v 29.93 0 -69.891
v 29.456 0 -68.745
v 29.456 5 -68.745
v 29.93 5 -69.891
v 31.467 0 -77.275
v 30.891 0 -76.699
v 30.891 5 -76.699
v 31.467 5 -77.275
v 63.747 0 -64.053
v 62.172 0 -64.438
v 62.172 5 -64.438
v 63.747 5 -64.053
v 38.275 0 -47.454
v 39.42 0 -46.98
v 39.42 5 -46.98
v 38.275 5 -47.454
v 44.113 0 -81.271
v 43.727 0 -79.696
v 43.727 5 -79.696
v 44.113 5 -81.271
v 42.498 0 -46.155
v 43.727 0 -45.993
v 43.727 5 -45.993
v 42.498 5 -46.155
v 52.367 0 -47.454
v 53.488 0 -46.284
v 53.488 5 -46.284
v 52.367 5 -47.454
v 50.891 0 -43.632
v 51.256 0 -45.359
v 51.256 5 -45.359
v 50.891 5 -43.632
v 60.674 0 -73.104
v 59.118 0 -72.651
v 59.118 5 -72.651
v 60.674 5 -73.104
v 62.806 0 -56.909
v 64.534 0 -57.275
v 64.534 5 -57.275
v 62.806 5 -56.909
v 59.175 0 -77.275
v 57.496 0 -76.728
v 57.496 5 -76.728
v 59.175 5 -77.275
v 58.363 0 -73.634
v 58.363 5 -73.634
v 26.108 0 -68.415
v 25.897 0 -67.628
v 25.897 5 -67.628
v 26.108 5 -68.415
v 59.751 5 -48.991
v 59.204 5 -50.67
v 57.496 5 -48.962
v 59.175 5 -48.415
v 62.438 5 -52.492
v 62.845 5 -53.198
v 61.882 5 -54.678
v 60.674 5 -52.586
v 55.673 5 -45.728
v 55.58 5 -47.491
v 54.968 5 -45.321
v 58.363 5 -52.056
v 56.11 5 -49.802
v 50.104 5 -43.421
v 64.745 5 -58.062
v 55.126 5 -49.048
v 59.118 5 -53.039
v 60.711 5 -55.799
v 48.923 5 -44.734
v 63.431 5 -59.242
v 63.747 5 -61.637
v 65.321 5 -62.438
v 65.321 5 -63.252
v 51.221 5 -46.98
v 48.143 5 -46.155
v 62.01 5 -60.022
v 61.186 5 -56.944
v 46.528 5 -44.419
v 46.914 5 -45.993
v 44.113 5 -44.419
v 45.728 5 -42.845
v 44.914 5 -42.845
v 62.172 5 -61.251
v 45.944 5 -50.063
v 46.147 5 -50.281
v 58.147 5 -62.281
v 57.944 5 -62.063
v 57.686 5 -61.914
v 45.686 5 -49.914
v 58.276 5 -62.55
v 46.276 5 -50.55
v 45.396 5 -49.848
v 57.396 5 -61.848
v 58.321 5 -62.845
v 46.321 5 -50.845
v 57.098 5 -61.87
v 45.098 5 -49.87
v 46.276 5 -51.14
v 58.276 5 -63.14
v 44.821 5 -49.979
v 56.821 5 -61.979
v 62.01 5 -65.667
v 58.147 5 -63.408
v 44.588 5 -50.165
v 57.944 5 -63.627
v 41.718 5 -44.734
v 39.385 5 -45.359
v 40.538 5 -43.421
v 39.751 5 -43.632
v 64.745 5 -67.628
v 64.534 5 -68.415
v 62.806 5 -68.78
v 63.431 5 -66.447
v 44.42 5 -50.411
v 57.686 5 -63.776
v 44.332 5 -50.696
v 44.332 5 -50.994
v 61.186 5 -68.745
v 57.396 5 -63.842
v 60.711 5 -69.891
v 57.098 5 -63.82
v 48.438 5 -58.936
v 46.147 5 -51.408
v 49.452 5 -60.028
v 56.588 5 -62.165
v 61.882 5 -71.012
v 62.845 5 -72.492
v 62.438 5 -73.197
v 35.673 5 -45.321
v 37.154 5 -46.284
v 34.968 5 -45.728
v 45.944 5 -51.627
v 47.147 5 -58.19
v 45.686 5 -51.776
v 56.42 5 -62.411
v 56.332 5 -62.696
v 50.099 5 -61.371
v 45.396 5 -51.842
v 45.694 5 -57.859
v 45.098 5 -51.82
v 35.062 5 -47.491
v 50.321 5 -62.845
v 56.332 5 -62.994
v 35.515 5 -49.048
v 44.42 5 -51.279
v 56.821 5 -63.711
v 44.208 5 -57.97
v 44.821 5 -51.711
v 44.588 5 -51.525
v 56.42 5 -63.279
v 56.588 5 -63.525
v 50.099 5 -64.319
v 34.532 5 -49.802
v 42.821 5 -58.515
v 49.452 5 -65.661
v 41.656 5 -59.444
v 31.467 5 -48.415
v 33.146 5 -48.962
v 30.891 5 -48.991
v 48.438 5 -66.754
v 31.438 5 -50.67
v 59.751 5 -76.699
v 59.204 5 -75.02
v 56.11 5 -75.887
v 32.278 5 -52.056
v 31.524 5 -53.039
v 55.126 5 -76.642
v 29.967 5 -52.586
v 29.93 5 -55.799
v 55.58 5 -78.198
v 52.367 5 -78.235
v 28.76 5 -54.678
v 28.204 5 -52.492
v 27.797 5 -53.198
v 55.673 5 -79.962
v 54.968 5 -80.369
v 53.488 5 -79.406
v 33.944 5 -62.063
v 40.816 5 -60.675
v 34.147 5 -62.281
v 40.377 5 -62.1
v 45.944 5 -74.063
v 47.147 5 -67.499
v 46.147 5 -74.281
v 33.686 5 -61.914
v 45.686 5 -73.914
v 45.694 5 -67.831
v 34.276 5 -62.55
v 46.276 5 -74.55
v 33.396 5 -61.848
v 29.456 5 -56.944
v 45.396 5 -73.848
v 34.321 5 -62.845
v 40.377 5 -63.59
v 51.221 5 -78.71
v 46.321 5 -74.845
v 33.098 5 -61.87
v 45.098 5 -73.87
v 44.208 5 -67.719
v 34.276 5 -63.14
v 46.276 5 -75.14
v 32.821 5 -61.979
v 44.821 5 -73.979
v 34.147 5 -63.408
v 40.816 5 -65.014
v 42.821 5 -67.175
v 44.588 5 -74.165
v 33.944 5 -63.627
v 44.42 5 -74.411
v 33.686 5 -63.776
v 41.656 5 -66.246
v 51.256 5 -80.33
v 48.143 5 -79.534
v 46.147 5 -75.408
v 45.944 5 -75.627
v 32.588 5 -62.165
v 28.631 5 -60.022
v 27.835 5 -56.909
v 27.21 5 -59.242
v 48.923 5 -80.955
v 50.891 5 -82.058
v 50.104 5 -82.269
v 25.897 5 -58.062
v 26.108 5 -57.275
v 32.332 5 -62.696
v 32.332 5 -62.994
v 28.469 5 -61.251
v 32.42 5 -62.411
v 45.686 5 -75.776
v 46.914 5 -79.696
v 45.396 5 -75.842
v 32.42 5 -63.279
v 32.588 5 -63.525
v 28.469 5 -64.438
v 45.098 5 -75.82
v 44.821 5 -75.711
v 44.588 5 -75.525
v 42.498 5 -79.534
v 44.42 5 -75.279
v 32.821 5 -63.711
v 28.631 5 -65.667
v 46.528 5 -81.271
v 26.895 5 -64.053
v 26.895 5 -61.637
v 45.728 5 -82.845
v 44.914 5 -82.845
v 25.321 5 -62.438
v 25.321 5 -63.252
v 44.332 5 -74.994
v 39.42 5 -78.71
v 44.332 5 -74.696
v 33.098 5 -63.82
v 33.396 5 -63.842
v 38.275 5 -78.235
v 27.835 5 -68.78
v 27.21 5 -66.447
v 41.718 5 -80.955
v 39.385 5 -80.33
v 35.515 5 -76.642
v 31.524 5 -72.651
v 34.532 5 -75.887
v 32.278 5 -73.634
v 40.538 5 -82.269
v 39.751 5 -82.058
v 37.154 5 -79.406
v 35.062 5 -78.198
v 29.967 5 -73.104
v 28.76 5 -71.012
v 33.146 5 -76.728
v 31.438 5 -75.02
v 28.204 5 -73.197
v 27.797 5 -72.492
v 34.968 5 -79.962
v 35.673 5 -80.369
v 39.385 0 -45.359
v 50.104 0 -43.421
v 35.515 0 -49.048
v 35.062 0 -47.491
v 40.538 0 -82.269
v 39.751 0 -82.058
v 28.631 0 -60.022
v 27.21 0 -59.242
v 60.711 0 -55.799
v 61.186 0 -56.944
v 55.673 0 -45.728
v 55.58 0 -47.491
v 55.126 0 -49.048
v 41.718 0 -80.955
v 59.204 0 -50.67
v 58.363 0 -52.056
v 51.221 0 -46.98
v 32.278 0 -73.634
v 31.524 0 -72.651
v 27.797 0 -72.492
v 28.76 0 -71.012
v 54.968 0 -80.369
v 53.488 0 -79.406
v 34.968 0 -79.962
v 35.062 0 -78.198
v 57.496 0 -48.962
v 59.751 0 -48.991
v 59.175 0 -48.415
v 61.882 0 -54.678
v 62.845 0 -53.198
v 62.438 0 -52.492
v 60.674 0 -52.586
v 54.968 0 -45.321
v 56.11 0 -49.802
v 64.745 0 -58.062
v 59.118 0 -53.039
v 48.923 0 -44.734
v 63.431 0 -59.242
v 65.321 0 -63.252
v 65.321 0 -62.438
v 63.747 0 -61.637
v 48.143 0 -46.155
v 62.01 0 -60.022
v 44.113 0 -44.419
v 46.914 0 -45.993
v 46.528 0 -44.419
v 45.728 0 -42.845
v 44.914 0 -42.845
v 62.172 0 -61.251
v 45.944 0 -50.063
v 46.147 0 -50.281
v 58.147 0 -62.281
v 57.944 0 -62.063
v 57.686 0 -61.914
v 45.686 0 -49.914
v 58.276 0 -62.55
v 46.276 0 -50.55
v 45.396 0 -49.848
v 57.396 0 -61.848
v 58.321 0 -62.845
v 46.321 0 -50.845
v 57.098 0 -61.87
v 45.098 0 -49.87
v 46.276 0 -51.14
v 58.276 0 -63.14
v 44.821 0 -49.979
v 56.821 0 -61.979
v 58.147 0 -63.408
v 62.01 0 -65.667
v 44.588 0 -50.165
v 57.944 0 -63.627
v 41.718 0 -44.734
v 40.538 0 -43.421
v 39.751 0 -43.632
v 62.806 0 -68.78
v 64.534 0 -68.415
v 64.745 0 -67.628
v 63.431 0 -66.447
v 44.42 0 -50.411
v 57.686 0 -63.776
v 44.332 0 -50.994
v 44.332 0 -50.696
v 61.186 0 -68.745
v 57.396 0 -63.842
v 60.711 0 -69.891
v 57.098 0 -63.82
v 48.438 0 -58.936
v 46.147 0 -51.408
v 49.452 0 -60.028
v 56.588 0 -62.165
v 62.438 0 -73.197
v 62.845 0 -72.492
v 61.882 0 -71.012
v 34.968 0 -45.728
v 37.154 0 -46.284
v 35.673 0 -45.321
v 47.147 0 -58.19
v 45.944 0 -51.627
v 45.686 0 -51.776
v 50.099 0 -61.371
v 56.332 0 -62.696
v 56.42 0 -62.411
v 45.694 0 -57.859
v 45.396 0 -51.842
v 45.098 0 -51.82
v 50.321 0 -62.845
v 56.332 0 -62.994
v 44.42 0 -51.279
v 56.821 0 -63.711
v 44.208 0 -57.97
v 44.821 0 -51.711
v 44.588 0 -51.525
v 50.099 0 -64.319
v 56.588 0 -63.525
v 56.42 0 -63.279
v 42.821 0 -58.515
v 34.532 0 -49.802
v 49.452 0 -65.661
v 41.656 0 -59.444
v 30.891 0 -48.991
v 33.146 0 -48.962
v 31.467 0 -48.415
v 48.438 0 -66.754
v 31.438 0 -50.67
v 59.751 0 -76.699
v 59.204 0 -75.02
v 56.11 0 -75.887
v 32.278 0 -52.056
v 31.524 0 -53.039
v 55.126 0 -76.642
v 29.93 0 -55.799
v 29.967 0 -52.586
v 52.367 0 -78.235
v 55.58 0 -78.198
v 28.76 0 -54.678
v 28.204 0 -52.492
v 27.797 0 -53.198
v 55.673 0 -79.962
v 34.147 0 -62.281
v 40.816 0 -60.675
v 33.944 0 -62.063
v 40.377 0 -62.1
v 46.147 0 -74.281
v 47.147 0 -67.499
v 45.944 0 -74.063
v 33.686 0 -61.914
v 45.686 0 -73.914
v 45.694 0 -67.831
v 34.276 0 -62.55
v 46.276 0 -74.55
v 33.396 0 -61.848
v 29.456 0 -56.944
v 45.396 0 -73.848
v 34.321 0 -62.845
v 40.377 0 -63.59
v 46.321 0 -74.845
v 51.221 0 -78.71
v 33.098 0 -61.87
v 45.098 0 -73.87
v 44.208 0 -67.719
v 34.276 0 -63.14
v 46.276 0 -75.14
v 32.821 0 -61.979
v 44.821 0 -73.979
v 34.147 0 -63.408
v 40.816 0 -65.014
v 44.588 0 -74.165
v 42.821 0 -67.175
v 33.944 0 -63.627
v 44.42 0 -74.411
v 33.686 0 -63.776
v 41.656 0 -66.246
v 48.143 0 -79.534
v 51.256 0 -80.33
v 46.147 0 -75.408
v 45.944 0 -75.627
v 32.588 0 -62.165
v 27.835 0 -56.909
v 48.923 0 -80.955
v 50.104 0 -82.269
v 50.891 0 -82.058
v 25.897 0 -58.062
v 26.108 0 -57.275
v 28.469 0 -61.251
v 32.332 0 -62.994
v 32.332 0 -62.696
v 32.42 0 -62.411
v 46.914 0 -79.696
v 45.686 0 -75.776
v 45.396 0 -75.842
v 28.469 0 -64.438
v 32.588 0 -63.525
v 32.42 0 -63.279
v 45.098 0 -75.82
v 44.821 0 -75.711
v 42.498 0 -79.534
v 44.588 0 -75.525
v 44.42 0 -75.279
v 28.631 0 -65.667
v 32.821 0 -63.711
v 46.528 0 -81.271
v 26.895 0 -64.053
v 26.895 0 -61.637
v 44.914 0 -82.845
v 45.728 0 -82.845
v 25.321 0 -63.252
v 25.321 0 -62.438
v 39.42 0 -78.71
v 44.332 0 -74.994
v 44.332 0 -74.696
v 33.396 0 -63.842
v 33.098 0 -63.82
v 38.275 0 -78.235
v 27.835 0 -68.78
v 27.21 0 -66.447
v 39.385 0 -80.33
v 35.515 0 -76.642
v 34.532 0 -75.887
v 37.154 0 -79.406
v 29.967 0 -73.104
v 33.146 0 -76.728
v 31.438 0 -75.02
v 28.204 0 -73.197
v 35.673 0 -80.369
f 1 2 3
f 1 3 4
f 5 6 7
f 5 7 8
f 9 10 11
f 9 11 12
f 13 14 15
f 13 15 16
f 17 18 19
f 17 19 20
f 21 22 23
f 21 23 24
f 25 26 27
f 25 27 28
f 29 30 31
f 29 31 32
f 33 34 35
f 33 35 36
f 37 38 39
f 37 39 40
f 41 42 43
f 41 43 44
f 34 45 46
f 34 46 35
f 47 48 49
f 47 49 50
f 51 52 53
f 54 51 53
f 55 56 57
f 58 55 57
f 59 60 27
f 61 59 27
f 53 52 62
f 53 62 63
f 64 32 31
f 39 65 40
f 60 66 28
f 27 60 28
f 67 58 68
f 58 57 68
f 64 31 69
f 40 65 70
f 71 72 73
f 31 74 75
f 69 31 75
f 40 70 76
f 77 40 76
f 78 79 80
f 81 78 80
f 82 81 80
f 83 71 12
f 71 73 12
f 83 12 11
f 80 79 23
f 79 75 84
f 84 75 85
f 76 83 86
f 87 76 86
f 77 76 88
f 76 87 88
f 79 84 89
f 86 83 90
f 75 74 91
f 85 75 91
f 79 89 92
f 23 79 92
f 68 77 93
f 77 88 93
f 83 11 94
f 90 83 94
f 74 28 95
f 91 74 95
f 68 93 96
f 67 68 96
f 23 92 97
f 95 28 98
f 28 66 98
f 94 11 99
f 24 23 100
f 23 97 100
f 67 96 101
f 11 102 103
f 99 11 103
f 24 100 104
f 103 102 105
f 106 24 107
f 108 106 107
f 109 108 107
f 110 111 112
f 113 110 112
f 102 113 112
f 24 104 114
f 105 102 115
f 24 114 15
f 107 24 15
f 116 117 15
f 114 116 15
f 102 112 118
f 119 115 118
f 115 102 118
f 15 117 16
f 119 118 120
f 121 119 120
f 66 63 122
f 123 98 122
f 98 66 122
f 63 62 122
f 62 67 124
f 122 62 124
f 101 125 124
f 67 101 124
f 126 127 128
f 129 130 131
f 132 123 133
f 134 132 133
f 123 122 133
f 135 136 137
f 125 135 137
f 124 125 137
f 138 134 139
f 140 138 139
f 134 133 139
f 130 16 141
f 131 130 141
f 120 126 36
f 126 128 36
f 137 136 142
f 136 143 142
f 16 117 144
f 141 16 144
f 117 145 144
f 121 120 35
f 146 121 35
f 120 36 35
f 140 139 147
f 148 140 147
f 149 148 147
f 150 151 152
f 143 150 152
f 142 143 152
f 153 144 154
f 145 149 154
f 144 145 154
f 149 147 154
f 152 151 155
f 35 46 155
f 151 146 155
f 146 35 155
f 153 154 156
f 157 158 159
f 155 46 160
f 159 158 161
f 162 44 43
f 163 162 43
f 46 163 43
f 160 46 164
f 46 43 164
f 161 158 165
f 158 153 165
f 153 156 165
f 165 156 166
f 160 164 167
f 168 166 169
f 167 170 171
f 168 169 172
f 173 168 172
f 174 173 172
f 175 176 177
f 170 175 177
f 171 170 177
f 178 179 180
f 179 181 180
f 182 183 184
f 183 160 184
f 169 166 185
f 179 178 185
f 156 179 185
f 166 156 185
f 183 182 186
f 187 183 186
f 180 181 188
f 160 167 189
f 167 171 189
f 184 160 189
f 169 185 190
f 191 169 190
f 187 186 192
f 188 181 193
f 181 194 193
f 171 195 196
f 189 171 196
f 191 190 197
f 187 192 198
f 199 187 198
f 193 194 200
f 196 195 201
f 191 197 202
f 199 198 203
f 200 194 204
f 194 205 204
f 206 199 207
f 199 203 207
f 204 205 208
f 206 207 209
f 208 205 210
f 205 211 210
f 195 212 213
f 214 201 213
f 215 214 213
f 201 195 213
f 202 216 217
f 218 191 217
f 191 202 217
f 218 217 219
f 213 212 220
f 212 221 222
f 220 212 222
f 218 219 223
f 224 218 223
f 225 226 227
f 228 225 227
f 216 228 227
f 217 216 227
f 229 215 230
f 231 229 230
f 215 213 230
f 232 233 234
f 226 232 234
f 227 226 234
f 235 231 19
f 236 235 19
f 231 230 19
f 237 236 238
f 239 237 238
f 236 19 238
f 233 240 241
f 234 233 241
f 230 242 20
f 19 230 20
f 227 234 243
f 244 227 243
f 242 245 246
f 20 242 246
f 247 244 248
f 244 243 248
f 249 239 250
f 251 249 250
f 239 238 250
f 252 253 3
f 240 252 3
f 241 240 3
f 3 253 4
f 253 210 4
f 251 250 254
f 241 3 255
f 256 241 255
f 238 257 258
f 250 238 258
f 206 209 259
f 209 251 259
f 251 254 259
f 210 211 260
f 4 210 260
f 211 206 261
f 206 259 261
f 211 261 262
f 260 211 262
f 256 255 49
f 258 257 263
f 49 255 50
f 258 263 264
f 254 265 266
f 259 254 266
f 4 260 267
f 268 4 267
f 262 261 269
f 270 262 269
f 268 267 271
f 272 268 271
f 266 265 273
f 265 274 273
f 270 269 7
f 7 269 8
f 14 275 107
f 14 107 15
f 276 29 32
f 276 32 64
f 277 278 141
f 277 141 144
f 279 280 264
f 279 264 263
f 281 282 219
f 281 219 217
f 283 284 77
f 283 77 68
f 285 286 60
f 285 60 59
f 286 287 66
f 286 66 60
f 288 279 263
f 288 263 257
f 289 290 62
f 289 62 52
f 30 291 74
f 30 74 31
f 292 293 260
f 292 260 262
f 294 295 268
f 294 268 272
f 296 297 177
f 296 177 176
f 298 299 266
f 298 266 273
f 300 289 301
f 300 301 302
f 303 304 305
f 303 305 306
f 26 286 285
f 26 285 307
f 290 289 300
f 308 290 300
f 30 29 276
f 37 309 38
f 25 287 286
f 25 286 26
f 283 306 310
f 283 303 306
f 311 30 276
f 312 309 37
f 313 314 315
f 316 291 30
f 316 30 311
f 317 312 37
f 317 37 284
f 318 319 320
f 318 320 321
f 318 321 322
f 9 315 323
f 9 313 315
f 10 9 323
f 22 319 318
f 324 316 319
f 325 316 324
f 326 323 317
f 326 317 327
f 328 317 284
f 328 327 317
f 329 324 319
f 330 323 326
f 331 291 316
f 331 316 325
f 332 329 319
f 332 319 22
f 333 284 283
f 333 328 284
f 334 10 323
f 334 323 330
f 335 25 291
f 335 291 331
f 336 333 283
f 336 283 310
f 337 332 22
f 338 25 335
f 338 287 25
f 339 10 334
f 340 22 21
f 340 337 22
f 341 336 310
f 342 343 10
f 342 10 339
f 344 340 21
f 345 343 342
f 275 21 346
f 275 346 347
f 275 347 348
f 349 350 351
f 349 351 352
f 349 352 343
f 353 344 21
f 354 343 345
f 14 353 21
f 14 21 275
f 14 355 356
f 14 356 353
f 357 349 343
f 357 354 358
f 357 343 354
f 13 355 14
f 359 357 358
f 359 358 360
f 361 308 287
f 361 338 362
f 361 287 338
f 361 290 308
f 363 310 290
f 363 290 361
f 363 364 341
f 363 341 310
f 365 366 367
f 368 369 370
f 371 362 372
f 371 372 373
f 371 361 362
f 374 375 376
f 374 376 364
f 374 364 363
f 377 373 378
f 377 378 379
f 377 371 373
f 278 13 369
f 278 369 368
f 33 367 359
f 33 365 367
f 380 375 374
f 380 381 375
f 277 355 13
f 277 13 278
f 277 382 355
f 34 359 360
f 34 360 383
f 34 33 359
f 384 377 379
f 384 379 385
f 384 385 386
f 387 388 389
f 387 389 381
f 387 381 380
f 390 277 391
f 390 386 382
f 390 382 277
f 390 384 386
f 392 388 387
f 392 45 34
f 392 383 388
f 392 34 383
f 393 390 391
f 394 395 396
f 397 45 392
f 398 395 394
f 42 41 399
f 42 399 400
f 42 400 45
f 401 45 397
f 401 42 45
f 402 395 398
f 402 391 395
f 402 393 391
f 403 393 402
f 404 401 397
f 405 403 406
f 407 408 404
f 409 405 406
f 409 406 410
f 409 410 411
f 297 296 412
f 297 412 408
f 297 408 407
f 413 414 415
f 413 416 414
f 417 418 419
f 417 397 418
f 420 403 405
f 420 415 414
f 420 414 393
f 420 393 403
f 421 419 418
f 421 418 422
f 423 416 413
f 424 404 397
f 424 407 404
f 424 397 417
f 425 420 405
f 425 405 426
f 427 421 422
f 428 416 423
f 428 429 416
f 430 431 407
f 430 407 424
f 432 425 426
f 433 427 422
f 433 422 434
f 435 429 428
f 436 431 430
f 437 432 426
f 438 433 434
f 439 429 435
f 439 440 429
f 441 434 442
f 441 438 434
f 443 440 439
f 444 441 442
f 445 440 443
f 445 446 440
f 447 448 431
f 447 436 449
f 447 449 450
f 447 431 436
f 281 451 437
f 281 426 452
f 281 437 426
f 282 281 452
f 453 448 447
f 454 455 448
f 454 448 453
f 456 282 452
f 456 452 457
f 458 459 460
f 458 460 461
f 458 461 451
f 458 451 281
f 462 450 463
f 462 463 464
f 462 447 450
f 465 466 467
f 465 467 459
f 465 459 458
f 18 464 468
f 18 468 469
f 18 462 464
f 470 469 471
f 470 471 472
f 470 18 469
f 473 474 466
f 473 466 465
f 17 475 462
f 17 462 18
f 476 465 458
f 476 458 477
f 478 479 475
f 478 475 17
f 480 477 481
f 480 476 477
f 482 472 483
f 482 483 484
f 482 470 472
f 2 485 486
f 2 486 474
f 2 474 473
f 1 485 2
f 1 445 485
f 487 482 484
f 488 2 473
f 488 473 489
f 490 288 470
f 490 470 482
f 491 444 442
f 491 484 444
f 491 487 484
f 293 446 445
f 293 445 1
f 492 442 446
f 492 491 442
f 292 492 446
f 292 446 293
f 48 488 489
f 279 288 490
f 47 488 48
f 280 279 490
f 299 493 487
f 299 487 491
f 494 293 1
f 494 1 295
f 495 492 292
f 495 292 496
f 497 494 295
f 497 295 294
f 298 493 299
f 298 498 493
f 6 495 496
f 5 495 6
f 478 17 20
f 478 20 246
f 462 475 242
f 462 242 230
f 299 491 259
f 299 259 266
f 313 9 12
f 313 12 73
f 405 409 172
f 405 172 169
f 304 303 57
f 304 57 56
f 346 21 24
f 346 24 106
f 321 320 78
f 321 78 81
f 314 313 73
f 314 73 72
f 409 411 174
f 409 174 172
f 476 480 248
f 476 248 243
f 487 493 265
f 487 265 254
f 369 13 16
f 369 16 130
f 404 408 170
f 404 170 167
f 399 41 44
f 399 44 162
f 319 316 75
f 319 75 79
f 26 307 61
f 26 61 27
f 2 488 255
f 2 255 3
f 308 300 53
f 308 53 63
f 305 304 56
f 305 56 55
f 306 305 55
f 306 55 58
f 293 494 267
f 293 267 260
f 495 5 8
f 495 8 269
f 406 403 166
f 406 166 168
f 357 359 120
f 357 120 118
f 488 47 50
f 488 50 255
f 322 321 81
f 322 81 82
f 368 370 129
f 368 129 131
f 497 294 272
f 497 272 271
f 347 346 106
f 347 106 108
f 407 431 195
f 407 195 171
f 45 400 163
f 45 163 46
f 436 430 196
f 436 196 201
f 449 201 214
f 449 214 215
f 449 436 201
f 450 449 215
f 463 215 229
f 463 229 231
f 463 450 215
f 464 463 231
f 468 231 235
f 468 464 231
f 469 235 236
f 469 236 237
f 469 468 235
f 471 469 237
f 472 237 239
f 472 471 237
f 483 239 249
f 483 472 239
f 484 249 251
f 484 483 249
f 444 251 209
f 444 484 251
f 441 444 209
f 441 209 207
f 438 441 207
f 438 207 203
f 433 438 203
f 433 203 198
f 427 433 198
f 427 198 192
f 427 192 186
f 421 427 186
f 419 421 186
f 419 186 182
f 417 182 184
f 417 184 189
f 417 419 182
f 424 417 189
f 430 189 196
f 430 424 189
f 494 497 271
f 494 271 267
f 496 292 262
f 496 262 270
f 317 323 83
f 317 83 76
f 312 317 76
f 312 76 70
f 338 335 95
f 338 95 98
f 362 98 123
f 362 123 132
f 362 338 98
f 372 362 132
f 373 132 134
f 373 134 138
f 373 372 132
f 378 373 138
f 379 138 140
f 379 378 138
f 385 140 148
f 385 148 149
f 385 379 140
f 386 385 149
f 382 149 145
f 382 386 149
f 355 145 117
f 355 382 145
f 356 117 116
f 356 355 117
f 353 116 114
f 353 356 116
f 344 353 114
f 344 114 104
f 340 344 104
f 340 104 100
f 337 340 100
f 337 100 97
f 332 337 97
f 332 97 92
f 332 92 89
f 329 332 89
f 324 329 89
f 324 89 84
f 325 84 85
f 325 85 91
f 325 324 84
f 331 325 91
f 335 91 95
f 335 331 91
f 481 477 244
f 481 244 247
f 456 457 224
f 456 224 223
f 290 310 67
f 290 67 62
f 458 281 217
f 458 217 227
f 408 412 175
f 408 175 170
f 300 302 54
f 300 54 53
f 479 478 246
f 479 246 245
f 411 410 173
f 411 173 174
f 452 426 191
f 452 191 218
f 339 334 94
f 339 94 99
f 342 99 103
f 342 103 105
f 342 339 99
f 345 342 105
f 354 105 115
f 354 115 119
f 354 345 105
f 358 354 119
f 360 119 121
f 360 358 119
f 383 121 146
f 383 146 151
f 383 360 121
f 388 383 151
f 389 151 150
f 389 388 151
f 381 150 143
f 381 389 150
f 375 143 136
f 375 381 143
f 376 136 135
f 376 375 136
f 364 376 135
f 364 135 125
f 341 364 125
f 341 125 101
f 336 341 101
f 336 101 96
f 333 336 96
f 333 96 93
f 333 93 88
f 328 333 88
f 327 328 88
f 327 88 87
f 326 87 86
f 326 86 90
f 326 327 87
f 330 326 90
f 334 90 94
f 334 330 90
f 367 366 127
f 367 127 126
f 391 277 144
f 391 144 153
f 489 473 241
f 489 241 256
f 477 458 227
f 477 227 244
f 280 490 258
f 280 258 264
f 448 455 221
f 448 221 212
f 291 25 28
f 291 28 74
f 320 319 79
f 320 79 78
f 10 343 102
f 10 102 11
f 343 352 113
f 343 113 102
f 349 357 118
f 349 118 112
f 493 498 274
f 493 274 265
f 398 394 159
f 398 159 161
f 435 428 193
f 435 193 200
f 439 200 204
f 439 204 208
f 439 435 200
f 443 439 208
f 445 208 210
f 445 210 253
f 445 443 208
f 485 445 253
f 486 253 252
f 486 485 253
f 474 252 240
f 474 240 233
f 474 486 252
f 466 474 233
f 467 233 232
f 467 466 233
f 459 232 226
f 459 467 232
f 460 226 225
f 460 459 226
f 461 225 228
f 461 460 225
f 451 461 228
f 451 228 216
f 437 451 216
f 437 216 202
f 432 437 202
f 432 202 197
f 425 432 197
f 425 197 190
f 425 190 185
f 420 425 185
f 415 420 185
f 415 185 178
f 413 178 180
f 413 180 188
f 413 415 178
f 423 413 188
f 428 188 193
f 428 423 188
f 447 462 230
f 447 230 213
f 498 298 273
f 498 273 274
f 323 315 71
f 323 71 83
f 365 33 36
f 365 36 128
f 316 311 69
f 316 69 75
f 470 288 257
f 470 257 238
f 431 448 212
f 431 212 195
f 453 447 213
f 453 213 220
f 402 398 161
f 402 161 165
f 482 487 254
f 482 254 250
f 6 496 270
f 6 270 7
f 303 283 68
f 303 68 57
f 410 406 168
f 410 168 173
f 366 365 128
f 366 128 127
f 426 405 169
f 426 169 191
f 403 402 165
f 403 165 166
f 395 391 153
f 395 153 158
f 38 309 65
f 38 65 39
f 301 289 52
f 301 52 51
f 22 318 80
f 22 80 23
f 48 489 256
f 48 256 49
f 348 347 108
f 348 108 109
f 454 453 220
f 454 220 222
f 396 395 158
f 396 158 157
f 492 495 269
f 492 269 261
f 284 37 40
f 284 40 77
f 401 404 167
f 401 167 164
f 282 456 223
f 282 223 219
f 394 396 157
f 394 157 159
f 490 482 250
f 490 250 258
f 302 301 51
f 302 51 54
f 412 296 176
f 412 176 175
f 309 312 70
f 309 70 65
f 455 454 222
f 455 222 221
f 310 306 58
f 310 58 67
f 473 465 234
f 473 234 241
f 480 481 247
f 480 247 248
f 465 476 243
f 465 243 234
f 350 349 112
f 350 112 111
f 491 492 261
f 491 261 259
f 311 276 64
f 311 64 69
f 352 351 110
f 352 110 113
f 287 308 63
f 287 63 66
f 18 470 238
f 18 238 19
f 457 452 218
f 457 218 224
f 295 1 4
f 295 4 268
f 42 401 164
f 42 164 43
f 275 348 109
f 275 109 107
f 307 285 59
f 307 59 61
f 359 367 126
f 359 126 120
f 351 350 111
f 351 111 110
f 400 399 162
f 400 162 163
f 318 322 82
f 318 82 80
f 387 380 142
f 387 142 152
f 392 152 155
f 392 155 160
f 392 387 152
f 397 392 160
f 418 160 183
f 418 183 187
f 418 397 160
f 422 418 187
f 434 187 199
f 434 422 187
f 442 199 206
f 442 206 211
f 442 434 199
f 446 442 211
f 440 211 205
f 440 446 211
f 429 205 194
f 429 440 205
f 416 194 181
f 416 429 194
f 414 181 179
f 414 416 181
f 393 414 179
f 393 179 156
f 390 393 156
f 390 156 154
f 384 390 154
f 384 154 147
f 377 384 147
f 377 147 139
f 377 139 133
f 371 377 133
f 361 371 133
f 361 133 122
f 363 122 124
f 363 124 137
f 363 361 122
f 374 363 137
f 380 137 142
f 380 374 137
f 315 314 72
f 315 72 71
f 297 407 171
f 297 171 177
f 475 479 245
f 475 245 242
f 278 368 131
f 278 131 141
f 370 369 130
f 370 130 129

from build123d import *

# Parameters (mm, degrees)
BOSS_EXTRUDE1_DEPTH = 5
SKETCH4_R           = 5
CUT_EXTRUDE1_DEPTH  = 5
SKETCH5_R           = 1
CUT_EXTRUDE2_DEPTH  = 5


with BuildPart() as part:
    # Sketch2 → Boss-Extrude1 (new body)
    with BuildSketch(Plane(origin=(0, 0, 0), x_dir=(1, 0, 0), z_dir=(0, 1, 0))):
        Polygon((62.172127475, 64.438287146), (63.746631591, 64.052516421), (65.320772998, 63.251970245), (65.320772998, 62.437646696), (63.746631591, 61.63710052), (62.172127475, 61.251330223), (62.010422663, 60.022472316), (63.431319755, 59.242350893), (64.744655445, 58.061714434), (64.533883435, 57.275066391), (62.806134576, 56.909358138), (61.185584837, 56.944164493), (60.711227056, 55.799059379), (61.881832707, 54.677762874), (62.844929445, 53.197526256), (62.437646696, 52.492214089), (60.674124543, 52.585997689), (59.117748594, 53.03908454), (58.363248469, 52.055804998), (59.203797973, 50.66971469), (59.750789184, 48.990670319), (59.174913579, 48.414794286), (57.495869208, 48.961785926), (56.1097789, 49.80233543), (55.126499358, 49.047834876), (55.579586209, 47.491459356), (55.67336981, 45.727937202), (54.968057642, 45.320654453), (53.487820596, 46.283751191), (52.366524519, 47.454356415), (51.221419405, 46.979999061), (51.25622576, 45.359448894), (50.890517507, 43.631700463), (50.103869465, 43.420928454), (48.923233005, 44.734264143), (48.143111582, 46.155161235), (46.914253675, 45.993456423), (46.528483378, 44.418952307), (45.727937202, 42.8448109), (44.913613653, 42.8448109), (44.113067477, 44.418952307), (43.727296752, 45.993456423), (42.498439273, 46.155161235), (41.718317422, 44.734264143), (40.537680963, 43.420928454), (39.751033348, 43.631700463), (39.385325095, 45.359448894), (39.420131451, 46.979999061), (38.275026336, 47.454356415), (37.153729831, 46.283751191), (35.673492785, 45.320654453), (34.968181046, 45.727937202), (35.061964647, 47.491459356), (35.515051497, 49.047834876), (34.531771955, 49.80233543), (33.145681219, 48.961785926), (31.466637276, 48.414794286), (30.890761243, 48.990670319), (31.437752883, 50.66971469), (32.278302387, 52.055804998), (31.523801833, 53.03908454), (29.967425885, 52.585997689), (28.20390416, 52.492214089), (27.796621411, 53.197526256), (28.759718149, 54.677762874), (29.930323372, 55.799059379), (29.455966018, 56.944164493), (27.835415852, 56.909358138), (26.107666992, 57.275066391), (25.896895411, 58.061714434), (27.210231101, 59.242350893), (28.631127764, 60.022472316), (28.46942338, 61.251330223), (26.894919264, 61.63710052), (25.320777429, 62.437646696), (25.320777429, 63.251970245), (26.894919264, 64.052516421), (28.46942338, 64.438287146), (28.631127764, 65.667144625), (27.210231101, 66.447266476), (25.896895411, 67.627902507), (26.107666992, 68.41455055), (27.835415852, 68.780258803), (29.455966018, 68.745452448), (29.930323372, 69.890557562), (28.759718149, 71.011854067), (27.796621411, 72.492090685), (28.20390416, 73.197402852), (29.967425885, 73.103619252), (31.523801833, 72.650532401), (32.278302387, 73.633811943), (31.437752883, 75.019902251), (30.890761243, 76.698946622), (31.466637276, 77.274822655), (33.145681219, 76.727831015), (34.531771955, 75.887281511), (35.515051497, 76.641782065), (35.061964647, 78.198157585), (34.968181046, 79.961679739), (35.673492785, 80.368962487), (37.153729831, 79.40586575), (38.275026336, 78.235260526), (39.420131451, 78.70961788), (39.385325095, 80.330168047), (39.751033348, 82.057916906), (40.537680963, 82.268688487), (41.718317422, 80.955352798), (42.498439273, 79.534456134), (43.727296752, 79.696160518), (44.113067477, 81.270664634), (44.913613653, 82.844806041), (45.727937202, 82.844806041), (46.528483378, 81.270664634), (46.914253675, 79.696160518), (48.143111582, 79.534456134), (48.923233005, 80.955352798), (50.103869465, 82.268688487), (50.890517507, 82.057916906), (51.25622576, 80.330168047), (51.221419405, 78.70961788), (52.366524519, 78.235260526), (53.487820596, 79.40586575), (54.968057642, 80.368962487), (55.67336981, 79.961679739), (55.579586209, 78.198157585), (55.126499358, 76.641782065), (56.1097789, 75.887281511), (57.495869208, 76.727831015), (59.174913579, 77.274822655), (59.750789184, 76.698946622), (59.203797973, 75.019902251), (58.363248469, 73.633811943), (59.117748594, 72.650532401), (60.674124543, 73.103619252), (62.437646696, 73.197402852), (62.844929445, 72.492090685), (61.881832707, 71.011854067), (60.711227056, 69.890557562), (61.185584837, 68.745452448), (62.806134576, 68.780258803), (64.533883435, 68.41455055), (64.744655445, 67.627902507), (63.431319755, 66.447266476), (62.010422663, 65.667144625), align=None)
    extrude(amount=BOSS_EXTRUDE1_DEPTH)

    # Sketch4 → Cut-Extrude1 (cut)
    with BuildSketch(Plane(origin=(0, 0, 0), x_dir=(1, 0, 0), z_dir=(0, 1, 0))):
        with Locations((45.320775214, 62.84480847)):
            Circle(SKETCH4_R)
    extrude(amount=CUT_EXTRUDE1_DEPTH, mode=Mode.SUBTRACT)

    # Sketch5 → Cut-Extrude2 (cut)
    with BuildSketch(Plane(origin=(0, 0, 0), x_dir=(1, 0, 0), z_dir=(0, 1, 0))):
        with Locations((45.320775428, 50.84480847)):
            Circle(SKETCH5_R)
        with Locations((33.320775428, 62.84480847)):
            Circle(SKETCH5_R)
        with Locations((45.320775428, 74.84480847)):
            Circle(SKETCH5_R)
        with Locations((57.320775428, 62.84480847)):
            Circle(SKETCH5_R)
    extrude(amount=CUT_EXTRUDE2_DEPTH, mode=Mode.SUBTRACT)


solid = part.part
